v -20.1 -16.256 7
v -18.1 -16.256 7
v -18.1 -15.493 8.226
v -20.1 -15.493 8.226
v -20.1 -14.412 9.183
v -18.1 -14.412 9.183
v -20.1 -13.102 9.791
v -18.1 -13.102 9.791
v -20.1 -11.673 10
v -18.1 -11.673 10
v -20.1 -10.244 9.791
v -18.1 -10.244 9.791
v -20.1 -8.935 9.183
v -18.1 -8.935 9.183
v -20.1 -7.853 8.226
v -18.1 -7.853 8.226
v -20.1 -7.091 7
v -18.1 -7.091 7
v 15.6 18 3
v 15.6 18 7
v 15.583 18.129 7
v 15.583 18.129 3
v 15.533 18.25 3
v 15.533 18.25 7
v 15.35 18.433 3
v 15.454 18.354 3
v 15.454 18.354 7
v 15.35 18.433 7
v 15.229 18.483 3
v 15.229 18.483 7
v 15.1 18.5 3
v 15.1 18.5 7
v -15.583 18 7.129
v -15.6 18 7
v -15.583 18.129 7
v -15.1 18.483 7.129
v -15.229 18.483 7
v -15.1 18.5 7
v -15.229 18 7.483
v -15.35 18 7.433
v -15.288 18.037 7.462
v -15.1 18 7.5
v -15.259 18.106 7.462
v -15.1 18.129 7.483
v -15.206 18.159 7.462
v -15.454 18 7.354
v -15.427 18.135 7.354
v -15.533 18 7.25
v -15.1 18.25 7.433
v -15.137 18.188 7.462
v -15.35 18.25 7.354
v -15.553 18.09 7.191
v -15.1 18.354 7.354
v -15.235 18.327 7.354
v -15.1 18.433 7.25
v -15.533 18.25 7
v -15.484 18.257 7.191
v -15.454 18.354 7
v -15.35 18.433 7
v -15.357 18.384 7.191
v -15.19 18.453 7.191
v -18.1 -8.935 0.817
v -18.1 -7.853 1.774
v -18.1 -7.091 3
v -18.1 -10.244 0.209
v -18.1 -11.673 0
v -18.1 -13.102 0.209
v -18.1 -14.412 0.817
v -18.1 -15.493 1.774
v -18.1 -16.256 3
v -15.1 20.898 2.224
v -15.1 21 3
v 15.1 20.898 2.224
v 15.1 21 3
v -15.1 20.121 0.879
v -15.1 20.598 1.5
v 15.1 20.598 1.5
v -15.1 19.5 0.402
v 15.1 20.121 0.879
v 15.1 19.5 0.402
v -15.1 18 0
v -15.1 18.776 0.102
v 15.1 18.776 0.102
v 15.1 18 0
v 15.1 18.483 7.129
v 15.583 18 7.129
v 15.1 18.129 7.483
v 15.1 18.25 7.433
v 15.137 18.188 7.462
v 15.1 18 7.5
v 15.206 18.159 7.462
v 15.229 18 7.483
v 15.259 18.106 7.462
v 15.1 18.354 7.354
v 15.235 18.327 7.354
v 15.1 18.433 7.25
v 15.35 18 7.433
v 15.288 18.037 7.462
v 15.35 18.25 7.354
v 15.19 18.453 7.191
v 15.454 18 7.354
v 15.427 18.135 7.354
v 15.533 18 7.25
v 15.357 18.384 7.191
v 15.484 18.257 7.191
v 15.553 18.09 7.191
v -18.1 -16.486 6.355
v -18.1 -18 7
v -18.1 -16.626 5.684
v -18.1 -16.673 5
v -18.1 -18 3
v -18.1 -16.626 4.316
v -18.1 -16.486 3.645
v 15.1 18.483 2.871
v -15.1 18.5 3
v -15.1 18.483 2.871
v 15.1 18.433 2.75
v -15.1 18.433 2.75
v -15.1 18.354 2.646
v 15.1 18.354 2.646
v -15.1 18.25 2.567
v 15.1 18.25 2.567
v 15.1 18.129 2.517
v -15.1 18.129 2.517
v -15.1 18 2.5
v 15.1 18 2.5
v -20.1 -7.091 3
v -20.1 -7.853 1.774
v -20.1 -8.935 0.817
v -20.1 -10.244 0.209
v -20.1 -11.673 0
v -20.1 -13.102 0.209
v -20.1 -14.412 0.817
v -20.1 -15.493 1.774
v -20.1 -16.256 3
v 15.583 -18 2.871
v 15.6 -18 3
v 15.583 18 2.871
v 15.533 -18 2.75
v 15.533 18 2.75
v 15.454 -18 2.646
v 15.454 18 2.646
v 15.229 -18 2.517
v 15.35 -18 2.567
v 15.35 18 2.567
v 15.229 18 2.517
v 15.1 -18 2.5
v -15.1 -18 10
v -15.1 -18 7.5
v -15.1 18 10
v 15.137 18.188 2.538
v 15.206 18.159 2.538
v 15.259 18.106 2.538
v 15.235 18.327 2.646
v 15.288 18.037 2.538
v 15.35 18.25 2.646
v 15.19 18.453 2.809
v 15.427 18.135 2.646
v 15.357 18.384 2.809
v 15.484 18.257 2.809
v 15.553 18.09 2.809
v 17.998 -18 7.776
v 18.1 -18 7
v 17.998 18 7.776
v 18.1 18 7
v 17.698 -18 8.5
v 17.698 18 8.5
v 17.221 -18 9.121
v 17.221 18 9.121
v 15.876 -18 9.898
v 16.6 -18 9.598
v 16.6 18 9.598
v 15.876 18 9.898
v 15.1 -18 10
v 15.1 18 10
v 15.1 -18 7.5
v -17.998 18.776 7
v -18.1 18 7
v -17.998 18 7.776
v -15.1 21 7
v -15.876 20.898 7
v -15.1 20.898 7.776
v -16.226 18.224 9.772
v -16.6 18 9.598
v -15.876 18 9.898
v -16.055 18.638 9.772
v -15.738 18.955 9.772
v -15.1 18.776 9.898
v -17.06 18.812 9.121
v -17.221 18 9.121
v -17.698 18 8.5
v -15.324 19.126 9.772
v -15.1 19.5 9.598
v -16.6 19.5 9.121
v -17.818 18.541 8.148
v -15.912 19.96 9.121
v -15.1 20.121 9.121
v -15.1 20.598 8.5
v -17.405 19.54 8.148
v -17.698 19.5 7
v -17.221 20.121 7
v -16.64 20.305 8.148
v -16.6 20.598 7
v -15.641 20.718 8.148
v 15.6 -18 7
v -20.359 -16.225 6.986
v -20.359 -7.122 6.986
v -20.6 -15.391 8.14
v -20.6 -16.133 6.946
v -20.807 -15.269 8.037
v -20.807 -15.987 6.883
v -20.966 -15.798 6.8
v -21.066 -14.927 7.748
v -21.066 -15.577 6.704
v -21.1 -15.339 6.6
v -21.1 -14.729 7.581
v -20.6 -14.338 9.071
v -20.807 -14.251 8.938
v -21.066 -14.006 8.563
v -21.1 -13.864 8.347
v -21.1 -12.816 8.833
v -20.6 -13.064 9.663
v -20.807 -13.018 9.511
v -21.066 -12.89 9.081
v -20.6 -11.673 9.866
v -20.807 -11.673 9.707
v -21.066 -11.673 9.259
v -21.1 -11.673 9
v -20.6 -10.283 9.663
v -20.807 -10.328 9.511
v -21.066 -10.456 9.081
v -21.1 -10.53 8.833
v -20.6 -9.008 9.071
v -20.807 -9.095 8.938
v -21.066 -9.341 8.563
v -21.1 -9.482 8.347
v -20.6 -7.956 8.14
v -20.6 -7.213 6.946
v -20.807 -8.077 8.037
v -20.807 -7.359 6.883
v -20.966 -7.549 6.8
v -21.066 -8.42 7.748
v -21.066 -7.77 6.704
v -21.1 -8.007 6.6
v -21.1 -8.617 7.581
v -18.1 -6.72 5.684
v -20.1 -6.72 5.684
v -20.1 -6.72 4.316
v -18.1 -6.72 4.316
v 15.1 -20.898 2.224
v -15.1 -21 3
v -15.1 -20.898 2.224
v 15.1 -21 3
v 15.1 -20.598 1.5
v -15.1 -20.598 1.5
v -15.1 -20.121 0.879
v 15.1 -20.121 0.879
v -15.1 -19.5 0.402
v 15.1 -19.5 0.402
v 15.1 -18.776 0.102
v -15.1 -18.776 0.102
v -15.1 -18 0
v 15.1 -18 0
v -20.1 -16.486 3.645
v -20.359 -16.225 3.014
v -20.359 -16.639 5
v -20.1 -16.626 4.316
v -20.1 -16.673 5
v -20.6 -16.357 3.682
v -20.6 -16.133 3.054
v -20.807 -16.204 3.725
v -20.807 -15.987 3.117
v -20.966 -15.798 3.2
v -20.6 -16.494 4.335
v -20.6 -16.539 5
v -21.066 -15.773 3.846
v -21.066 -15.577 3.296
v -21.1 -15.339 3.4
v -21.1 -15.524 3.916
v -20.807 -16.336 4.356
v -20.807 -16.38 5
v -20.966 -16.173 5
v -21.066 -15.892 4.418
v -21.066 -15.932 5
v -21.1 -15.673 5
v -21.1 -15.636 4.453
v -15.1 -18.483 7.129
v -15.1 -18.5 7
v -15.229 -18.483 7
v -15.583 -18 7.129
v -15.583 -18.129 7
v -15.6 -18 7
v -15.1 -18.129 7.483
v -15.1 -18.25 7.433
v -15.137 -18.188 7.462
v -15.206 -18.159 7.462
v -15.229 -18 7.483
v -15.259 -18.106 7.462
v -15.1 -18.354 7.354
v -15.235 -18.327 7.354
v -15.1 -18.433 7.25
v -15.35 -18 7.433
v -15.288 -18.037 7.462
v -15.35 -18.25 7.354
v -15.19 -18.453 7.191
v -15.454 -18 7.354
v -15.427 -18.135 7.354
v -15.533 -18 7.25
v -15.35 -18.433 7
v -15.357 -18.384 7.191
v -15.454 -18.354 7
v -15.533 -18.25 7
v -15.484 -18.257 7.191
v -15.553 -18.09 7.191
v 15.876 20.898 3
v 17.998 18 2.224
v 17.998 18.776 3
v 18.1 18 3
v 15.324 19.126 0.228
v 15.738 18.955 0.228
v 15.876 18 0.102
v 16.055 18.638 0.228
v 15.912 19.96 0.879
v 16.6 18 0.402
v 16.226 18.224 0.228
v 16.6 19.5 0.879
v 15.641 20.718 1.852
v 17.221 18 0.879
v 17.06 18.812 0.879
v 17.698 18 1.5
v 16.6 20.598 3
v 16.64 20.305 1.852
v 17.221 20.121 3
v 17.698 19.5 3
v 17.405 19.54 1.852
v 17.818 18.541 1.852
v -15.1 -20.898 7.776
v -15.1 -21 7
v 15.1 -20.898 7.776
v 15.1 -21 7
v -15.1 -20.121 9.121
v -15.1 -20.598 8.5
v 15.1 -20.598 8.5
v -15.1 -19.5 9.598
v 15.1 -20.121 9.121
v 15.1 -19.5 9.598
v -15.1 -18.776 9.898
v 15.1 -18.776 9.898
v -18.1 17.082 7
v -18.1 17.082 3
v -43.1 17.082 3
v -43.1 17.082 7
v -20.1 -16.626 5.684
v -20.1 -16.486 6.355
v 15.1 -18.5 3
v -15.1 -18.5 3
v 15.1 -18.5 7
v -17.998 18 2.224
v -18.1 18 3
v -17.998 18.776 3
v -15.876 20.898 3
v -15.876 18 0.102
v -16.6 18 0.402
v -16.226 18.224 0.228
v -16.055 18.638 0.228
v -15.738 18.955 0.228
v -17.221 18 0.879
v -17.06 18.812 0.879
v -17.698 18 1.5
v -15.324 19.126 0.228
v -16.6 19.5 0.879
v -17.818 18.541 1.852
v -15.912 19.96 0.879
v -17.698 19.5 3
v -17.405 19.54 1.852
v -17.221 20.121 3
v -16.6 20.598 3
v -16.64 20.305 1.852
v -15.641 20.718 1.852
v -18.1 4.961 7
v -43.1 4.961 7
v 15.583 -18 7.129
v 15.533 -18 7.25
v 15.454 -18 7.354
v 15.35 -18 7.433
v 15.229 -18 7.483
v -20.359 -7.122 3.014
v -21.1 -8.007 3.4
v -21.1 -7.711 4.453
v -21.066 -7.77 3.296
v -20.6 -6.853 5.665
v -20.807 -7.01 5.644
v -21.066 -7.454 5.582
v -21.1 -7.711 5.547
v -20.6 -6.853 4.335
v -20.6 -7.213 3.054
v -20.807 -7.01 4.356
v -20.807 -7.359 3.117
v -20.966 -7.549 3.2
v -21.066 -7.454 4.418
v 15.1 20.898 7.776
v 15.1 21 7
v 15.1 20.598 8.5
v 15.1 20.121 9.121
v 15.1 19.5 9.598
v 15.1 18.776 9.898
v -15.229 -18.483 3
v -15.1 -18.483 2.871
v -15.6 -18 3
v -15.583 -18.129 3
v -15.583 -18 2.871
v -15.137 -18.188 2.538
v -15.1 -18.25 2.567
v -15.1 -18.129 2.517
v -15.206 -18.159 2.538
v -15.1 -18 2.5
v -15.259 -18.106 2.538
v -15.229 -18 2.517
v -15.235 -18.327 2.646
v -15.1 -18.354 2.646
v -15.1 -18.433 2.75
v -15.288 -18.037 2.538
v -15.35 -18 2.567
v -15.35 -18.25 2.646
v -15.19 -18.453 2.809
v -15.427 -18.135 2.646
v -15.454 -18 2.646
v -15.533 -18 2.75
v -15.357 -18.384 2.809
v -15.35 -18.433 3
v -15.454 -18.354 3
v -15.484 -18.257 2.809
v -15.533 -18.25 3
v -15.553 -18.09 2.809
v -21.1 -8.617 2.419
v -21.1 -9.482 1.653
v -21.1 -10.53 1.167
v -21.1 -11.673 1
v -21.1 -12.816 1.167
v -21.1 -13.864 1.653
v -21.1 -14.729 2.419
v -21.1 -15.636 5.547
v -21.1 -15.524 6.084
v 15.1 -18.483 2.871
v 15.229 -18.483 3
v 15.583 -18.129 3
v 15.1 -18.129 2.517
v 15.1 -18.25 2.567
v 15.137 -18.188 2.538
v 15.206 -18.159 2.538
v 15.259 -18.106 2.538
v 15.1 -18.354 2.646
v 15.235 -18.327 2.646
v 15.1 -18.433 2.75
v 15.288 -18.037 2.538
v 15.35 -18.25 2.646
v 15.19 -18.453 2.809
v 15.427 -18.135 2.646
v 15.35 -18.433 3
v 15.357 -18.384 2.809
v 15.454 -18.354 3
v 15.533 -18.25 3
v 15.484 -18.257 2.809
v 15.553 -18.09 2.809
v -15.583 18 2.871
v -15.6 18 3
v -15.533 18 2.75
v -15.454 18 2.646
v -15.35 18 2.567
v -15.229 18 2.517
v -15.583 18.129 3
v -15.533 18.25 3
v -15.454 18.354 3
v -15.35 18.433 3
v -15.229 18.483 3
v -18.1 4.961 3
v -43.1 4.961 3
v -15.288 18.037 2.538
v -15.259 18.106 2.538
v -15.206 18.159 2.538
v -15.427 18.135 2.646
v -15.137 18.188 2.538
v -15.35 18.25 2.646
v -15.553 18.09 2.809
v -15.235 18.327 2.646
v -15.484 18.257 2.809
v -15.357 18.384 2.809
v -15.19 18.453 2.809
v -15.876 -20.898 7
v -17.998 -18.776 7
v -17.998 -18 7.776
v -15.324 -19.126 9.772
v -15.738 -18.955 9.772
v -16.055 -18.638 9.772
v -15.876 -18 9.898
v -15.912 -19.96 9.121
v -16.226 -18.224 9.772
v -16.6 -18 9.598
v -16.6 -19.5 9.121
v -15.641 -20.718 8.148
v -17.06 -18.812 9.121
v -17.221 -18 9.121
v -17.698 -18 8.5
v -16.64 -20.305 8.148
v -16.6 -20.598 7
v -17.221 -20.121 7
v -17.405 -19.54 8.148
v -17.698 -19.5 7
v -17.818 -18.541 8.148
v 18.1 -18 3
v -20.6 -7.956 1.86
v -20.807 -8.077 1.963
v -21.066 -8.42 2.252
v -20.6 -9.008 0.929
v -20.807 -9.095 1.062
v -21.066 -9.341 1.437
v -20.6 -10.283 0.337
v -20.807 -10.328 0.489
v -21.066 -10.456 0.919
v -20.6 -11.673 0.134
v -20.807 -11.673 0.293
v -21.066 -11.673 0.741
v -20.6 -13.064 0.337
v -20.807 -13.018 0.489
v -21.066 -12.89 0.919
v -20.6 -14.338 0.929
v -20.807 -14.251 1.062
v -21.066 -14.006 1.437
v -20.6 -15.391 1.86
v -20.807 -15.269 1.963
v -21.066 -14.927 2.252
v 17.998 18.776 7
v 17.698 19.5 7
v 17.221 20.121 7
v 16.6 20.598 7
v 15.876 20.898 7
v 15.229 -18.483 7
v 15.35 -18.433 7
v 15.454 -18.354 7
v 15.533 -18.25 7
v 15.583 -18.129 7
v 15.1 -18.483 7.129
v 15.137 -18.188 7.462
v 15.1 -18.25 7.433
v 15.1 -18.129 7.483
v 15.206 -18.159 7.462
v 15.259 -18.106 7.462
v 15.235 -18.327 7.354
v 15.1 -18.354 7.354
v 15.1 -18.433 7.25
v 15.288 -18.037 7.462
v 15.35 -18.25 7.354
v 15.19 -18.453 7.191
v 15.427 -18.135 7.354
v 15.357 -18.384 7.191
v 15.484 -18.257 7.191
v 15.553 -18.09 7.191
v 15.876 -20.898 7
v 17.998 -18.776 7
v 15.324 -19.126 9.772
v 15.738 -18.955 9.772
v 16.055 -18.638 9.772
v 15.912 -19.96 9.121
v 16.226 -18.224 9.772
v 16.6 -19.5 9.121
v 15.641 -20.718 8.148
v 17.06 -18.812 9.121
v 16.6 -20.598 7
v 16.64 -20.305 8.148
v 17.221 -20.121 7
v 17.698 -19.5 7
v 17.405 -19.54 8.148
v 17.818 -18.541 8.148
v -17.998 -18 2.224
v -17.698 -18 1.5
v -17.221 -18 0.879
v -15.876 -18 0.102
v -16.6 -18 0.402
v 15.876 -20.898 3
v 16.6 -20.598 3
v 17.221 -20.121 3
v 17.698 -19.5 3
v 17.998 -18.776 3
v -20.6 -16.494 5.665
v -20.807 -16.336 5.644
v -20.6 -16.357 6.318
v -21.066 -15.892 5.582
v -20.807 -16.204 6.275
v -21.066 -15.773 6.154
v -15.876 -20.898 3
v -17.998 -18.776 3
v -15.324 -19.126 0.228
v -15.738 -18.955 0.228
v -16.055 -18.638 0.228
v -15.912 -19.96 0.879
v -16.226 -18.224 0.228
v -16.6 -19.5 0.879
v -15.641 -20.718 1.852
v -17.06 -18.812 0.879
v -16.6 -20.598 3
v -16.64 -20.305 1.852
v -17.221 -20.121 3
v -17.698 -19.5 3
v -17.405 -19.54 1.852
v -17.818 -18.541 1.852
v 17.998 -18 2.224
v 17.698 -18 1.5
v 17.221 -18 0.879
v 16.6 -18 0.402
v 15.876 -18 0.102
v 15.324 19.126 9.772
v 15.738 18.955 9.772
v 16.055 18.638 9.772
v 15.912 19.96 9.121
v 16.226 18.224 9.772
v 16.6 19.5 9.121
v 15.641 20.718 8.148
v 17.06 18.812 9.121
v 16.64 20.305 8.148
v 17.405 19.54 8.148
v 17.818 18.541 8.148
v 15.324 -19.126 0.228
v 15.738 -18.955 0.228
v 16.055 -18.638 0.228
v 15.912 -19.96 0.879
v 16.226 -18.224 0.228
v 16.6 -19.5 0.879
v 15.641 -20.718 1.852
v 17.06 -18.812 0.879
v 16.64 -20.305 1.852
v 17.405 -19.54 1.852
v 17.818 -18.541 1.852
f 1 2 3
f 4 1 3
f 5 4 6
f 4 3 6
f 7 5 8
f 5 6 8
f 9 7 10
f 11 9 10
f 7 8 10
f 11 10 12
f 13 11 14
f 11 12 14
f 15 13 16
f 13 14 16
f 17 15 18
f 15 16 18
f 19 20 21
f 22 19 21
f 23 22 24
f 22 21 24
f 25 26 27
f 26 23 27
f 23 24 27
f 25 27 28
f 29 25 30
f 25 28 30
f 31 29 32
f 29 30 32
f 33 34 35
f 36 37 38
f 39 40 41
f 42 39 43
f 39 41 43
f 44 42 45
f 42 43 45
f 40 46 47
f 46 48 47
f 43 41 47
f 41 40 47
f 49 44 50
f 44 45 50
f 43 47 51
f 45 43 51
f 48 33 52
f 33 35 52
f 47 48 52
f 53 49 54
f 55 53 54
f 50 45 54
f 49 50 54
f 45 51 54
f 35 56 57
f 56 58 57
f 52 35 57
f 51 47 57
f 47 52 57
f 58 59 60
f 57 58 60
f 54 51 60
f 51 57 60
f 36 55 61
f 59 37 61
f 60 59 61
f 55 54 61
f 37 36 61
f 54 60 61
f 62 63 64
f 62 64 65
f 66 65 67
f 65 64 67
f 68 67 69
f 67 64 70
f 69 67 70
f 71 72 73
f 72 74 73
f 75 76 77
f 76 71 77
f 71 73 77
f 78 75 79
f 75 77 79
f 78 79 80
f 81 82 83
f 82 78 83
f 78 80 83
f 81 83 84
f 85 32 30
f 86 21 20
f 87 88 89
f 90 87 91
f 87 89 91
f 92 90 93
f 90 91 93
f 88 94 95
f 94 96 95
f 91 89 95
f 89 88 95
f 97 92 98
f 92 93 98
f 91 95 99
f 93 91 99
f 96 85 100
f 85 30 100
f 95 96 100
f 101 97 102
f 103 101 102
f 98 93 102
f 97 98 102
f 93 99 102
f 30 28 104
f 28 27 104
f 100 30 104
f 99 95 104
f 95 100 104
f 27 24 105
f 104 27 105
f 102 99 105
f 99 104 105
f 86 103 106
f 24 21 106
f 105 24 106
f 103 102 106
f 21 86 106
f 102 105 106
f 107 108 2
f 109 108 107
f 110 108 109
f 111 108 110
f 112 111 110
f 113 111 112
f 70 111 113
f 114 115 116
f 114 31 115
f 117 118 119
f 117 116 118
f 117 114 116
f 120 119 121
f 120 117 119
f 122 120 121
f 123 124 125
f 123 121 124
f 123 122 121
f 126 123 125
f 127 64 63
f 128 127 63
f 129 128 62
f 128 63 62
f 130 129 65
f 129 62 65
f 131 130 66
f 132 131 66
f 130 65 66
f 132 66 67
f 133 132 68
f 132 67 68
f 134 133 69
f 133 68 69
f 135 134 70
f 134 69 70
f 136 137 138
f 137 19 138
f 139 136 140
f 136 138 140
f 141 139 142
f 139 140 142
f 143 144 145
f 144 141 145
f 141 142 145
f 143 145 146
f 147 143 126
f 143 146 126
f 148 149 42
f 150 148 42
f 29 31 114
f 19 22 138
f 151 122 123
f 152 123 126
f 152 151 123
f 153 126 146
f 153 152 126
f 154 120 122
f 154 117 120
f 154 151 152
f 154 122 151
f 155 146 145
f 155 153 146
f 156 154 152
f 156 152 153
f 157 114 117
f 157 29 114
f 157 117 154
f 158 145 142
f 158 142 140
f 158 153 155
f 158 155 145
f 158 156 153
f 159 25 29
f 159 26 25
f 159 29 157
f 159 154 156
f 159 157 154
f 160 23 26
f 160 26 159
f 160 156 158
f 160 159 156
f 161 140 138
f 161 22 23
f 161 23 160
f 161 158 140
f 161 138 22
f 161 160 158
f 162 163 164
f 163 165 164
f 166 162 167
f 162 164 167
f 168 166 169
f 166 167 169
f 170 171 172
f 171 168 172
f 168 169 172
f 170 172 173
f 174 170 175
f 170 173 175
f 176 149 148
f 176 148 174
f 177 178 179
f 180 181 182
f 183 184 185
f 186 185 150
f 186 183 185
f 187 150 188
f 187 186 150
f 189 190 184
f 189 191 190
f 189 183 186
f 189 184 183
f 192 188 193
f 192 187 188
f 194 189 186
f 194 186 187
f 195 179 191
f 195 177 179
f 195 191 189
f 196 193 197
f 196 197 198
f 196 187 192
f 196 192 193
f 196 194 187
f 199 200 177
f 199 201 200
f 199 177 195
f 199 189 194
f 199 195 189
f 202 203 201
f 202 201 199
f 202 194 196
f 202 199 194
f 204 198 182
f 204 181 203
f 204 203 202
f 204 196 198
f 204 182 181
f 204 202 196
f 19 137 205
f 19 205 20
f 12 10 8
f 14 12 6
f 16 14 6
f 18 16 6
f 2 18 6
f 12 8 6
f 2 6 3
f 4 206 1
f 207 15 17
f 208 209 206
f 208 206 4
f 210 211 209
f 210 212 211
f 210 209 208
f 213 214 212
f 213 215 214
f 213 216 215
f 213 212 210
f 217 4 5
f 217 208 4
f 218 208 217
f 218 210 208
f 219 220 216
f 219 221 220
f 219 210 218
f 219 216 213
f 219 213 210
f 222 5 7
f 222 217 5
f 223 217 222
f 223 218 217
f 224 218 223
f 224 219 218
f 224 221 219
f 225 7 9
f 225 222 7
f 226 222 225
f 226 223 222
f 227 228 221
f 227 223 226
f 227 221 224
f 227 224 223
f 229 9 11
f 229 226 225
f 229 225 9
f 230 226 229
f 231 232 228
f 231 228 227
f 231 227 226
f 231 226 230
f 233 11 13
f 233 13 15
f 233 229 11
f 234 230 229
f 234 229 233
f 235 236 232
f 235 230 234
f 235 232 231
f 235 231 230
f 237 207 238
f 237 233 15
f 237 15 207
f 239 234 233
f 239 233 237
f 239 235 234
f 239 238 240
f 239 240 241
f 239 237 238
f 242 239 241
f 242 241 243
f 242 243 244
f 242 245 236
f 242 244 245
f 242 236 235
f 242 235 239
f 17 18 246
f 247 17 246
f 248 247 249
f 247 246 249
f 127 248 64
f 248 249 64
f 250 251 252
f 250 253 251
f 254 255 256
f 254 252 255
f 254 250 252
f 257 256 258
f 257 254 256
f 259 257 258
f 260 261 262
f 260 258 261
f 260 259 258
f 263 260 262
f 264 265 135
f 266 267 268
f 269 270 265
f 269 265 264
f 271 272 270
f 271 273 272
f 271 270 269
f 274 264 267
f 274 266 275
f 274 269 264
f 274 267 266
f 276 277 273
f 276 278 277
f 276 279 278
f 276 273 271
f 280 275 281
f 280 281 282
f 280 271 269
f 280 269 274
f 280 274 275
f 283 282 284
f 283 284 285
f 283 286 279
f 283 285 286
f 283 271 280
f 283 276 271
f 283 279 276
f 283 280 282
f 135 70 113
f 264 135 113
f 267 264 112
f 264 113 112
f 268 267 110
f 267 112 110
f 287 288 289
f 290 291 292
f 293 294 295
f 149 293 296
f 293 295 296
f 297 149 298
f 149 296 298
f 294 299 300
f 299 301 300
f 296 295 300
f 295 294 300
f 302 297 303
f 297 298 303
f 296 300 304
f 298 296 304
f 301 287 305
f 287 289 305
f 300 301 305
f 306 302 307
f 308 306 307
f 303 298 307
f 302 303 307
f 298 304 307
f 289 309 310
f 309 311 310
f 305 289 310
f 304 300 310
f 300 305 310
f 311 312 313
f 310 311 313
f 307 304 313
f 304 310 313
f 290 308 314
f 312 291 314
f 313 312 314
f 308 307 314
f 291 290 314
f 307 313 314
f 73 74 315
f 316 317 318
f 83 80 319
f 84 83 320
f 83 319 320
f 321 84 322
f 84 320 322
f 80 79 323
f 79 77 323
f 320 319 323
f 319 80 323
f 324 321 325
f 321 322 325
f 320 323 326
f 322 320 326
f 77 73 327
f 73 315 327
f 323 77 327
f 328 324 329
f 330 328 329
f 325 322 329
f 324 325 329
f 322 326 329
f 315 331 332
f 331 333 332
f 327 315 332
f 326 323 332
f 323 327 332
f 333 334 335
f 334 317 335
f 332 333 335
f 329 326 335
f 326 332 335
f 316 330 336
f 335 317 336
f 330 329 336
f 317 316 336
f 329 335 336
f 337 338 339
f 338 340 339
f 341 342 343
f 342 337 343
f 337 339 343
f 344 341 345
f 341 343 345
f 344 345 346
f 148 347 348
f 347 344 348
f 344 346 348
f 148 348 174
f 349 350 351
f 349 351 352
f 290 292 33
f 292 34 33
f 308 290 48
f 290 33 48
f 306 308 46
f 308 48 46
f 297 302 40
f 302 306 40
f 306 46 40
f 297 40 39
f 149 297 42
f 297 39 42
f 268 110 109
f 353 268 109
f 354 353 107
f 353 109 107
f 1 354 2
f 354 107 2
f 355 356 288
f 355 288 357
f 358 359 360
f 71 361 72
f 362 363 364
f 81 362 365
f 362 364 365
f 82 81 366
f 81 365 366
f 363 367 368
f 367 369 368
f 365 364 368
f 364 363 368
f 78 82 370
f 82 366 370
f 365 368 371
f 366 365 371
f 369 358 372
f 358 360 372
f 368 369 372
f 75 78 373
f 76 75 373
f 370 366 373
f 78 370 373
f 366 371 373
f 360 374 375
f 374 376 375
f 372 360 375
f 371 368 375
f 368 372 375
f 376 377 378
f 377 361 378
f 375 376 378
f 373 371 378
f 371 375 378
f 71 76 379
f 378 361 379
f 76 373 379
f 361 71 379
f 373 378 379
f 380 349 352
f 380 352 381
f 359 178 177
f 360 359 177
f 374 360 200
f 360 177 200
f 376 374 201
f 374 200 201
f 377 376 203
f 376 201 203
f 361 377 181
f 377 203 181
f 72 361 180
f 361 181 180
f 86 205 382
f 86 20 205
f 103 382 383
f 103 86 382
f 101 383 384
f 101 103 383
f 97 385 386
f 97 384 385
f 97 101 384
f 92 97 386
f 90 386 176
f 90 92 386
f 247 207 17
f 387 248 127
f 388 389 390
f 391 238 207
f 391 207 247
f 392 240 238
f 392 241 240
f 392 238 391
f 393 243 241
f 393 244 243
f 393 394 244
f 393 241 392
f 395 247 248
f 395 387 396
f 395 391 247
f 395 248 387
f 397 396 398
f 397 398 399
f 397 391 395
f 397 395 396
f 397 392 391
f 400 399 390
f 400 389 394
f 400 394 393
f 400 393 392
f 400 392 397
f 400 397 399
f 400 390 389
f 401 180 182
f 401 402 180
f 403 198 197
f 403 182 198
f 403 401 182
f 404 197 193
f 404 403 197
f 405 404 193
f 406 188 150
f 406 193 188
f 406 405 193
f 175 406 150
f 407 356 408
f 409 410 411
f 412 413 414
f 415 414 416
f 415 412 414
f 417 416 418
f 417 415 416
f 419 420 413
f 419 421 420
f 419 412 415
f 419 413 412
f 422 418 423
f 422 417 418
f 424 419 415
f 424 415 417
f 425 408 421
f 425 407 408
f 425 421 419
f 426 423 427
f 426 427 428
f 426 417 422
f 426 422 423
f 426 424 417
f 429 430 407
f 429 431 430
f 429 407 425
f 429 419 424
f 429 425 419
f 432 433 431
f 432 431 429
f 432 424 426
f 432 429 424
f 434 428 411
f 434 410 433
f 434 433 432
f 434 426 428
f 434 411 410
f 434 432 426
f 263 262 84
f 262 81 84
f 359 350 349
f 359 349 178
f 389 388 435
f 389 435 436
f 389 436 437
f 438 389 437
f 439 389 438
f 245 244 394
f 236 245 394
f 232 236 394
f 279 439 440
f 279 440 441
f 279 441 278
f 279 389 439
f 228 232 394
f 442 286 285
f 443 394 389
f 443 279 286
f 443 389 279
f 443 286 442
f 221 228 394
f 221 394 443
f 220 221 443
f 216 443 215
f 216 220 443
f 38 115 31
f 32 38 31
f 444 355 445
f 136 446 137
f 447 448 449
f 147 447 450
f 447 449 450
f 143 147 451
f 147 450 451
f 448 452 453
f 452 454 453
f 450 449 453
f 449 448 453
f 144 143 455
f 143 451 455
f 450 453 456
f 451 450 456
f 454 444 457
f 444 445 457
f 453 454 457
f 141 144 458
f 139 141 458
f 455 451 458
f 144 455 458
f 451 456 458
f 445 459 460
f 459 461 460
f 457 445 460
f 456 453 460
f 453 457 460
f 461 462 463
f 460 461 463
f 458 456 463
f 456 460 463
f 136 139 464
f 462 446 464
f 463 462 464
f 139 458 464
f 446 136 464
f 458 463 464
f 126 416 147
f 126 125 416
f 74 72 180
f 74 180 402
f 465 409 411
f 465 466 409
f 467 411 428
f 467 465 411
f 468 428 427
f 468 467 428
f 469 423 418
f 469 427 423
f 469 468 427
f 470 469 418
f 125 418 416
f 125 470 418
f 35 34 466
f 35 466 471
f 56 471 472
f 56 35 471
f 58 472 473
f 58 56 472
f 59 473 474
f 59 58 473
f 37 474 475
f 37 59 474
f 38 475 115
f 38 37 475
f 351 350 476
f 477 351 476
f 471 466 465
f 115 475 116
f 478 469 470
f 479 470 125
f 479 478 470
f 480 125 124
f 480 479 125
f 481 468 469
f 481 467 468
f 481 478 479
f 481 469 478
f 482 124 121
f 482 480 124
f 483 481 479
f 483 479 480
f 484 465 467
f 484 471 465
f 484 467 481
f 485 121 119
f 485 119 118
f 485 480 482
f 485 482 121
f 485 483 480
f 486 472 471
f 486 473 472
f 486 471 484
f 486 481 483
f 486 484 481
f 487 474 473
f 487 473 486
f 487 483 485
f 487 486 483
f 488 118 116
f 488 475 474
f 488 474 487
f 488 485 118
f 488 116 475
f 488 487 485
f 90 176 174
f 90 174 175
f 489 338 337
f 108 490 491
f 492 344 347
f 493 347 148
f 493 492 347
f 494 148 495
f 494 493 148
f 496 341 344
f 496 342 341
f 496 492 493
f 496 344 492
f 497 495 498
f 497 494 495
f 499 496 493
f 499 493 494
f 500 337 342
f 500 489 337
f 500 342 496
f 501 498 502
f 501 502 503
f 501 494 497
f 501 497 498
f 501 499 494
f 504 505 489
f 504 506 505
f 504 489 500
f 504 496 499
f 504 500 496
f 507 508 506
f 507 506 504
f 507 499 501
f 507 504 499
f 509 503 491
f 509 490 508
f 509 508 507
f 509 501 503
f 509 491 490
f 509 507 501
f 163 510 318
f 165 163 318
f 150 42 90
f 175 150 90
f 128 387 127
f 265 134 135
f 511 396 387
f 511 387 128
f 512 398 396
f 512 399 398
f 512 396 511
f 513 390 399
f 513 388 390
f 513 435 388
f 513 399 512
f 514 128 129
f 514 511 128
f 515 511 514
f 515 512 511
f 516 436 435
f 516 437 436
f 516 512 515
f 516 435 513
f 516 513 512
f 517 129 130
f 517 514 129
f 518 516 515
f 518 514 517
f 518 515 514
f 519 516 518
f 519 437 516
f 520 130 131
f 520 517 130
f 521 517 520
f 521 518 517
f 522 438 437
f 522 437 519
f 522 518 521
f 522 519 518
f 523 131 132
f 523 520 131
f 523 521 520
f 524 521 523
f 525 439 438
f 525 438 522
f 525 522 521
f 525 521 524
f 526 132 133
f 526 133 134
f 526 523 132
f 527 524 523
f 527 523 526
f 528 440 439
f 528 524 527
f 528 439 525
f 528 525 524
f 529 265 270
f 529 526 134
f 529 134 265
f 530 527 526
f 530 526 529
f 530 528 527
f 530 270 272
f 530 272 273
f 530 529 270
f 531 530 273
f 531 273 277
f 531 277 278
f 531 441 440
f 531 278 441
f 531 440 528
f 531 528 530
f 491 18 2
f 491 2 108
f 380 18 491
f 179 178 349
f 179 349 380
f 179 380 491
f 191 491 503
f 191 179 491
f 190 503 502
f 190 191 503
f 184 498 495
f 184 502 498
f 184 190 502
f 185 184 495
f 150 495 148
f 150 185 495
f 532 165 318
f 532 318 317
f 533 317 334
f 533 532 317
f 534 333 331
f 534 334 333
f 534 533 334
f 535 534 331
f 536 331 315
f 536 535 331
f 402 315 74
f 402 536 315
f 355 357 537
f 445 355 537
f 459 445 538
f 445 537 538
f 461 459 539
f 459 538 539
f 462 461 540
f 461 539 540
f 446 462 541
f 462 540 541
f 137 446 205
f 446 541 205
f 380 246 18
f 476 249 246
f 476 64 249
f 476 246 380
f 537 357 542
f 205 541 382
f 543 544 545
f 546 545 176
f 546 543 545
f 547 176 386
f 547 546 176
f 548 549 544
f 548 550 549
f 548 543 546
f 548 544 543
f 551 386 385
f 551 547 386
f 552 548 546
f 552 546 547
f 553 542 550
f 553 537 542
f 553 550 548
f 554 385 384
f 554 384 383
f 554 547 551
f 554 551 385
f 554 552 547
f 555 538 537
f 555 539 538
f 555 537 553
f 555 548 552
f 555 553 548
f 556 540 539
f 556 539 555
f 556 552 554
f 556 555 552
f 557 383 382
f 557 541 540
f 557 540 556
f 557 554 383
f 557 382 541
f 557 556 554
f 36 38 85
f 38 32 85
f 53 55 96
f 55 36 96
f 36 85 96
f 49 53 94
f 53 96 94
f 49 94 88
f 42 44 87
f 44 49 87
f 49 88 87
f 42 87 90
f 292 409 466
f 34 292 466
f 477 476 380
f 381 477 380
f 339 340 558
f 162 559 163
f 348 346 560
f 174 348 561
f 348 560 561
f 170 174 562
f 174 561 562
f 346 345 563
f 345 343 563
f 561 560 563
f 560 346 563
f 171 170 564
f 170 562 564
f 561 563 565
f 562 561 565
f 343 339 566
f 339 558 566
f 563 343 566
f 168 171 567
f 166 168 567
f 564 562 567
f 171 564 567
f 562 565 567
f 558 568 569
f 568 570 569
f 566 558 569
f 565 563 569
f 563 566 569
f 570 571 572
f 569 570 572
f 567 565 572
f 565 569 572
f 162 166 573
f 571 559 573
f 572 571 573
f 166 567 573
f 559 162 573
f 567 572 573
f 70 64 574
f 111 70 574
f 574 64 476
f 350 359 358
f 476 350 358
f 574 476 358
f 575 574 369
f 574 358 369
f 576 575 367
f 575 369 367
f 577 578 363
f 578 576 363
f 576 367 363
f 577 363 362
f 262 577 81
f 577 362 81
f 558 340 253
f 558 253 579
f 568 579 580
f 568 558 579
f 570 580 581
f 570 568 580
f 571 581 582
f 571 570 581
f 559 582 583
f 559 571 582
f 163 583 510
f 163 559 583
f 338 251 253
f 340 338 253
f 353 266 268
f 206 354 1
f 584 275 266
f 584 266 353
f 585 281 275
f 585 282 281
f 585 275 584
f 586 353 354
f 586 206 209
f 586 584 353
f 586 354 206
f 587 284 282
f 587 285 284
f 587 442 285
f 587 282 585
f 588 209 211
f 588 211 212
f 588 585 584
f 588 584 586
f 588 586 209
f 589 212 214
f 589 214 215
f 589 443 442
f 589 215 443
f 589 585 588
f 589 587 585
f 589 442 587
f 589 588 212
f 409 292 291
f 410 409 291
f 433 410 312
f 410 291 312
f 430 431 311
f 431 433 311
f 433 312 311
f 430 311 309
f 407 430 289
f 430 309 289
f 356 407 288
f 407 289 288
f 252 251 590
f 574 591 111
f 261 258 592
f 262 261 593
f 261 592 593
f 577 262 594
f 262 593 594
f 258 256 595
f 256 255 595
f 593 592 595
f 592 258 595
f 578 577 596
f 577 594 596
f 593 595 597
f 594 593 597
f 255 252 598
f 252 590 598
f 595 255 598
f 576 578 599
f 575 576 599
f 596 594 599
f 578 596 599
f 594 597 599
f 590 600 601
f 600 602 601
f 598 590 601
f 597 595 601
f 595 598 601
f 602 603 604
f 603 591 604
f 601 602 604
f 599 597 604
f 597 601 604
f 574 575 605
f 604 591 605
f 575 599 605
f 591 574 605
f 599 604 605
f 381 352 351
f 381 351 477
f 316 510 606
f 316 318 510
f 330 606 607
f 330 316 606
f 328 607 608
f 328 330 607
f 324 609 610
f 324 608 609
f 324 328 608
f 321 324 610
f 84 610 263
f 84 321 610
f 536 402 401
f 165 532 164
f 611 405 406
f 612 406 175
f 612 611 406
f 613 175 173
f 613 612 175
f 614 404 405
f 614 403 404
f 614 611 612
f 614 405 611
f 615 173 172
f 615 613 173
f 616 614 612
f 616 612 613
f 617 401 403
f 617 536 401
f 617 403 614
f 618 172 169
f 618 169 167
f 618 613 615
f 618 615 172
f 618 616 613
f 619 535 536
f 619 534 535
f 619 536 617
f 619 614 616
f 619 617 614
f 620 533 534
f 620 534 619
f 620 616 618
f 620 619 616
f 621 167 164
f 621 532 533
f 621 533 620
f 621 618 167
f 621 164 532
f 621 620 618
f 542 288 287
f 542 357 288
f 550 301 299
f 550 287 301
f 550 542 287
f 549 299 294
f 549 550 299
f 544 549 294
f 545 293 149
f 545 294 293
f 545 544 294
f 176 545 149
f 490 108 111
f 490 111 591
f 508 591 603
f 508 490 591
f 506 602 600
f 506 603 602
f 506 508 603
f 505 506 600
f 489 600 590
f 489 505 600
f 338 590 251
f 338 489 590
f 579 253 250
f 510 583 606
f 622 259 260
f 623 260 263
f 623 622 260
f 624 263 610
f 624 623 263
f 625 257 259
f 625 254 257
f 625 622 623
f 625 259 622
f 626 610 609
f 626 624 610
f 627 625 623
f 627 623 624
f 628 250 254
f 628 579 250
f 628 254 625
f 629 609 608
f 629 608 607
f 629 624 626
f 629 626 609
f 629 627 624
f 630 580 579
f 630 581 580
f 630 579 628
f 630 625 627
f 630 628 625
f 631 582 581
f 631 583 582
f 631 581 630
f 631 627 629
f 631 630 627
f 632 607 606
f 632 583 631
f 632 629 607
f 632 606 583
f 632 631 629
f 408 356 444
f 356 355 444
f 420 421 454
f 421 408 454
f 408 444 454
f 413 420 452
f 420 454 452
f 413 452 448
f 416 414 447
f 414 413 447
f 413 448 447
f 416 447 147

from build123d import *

# Parameters (mm, degrees)
F0_W     = 36.2
F0_H     = 42
F1_DEPTH = 10
F2_R     = 3
F3_T     = -2.5
F5_DEPTH = 3
F6_R     = 1
F7_W     = 12.1205560863
F7_H     = 4
F8_DEPTH = 25


# Not quite as in the source:
# - a shell that OpenCascade refuses in one call is made with other operations: the cavity is built on its own and cut out


with BuildPart() as f1:
    # F0 (on Top) → F1 (new body)
    with BuildSketch(Plane.XY):
        Rectangle(F0_W, F0_H)
    extrude(amount=F1_DEPTH)

    # F2
    f2_edges = [f1.edges().sort_by_distance(p)[0] for p in [
        (-18.1, -21, 5),
        (18.1, -21, 5),
        (0, -21, 0),
        (0, -21, 10),
        (-18.1, 21, 5),
        (-18.1, 0, 0),
        (-18.1, 0, 10),
        (18.1, 21, 5),
        (0, 21, 0),
        (0, 21, 10),
        (18.1, 0, 0),
        (18.1, 0, 10),
    ]]
    fillet(f2_edges, radius=F2_R)

    # F3: a shell. OpenCascade refuses it in one call, so the cavity is built on its own and cut out:
    # the body offset inwards by the wall thickness, plus a prism from it out through each open face.
    f3_core = offset(f1.part, amount=F3_T, mode=Mode.PRIVATE)
    f3_exits = [f3_core.faces().sort_by_distance(p)[0] for p in [
        (0, 0, 7.5),
    ]]
    add(f3_core, mode=Mode.SUBTRACT)
    extrude(f3_exits, amount=-F3_T, mode=Mode.SUBTRACT)

    # F4 (on face) → F5 (join)
    with BuildSketch(Plane(origin=(-18.1, 0, 0), x_dir=(0, -1, 0), z_dir=(-1, 0, 0))):
        with BuildLine():
            ThreePointArc((7.0906764033, 3), (11.6732520983, 0), (16.2558277932, 3))
            Line((16.2558277932, 3), (7.0906764033, 3))
        make_face()
        with BuildLine():
            Line((7.0906764033, 7), (16.2558277932, 7))
            ThreePointArc((16.2558277932, 7), (11.6732520983, 10), (7.0906764033, 7))
        make_face()
        with BuildLine():
            ThreePointArc((16.2558277932, 3), (16.5677836629, 3.9784517816), (16.6732520983, 5))
            ThreePointArc((16.6732520983, 5), (16.5677836629, 6.0215482184), (16.2558277932, 7))
            Line((16.2558277932, 7), (7.0906764033, 7))
            ThreePointArc((7.0906764033, 7), (6.6732520983, 5), (7.0906764033, 3))
            Line((7.0906764033, 3), (16.2558277932, 3))
        make_face()
    extrude(amount=F5_DEPTH)

    # F6
    f6_edges = [f1.edges().sort_by_distance(p)[0] for p in [
        (-21.1, -7.090676, 7),
    ]]
    fillet(f6_edges, radius=F6_R)

    # F7 (on face) → F8 (join)
    with BuildSketch(Plane(origin=(-18.1, 0, 0), x_dir=(0, -1, 0), z_dir=(-1, 0, 0))):
        with Locations((-11.0213514417, 5)):
            Rectangle(F7_W, F7_H)
    extrude(amount=F8_DEPTH)


solid = f1.part
